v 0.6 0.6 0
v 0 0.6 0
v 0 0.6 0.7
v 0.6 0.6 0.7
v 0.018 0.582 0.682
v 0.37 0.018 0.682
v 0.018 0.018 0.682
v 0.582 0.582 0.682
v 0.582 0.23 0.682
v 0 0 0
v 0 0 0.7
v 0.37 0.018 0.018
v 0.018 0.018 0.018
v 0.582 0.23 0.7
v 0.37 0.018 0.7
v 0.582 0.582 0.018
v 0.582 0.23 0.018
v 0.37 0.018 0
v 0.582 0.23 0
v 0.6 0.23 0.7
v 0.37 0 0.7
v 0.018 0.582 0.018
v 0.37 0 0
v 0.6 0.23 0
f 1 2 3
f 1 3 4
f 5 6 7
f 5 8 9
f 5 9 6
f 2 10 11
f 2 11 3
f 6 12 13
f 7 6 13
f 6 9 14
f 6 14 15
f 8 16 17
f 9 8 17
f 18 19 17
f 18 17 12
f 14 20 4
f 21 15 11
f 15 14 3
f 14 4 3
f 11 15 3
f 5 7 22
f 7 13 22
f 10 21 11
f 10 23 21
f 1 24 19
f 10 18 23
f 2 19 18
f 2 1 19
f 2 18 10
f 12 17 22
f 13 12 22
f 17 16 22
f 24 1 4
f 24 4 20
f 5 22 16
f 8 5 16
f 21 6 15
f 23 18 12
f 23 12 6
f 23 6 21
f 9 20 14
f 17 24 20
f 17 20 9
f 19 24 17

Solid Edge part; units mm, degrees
sketch "Sketch1" plane through (0, 0, 0) normal (0, 0, 1) x (1, 0, 0)
  line L0 (0, 0) -> (0, 0.6)
  line L1 (0, 0.6) -> (0.6, 0.6)
  line L2 (0.6, 0.6) -> (0.6, 0.23)
  line L3 (0.6, 0.23) -> (0.582, 0.23)
  line L4 (0.582, 0.23) -> (0.37, 0.018)
  line L5 (0.37, 0.018) -> (0.37, 0)
  line L6 (0.37, 0) -> (0, 0)
  dimension "D1" = 0.6
  dimension "D2" = 0.37
  dimension "D3" = 0.018
extrude "Protrusion1" add sketch "Sketch1" along normal blind 0.7
shell "Dünnwand_1" thickness 0.018 removed faces 1 at (0.5488, 0.1968, 0.5763)
